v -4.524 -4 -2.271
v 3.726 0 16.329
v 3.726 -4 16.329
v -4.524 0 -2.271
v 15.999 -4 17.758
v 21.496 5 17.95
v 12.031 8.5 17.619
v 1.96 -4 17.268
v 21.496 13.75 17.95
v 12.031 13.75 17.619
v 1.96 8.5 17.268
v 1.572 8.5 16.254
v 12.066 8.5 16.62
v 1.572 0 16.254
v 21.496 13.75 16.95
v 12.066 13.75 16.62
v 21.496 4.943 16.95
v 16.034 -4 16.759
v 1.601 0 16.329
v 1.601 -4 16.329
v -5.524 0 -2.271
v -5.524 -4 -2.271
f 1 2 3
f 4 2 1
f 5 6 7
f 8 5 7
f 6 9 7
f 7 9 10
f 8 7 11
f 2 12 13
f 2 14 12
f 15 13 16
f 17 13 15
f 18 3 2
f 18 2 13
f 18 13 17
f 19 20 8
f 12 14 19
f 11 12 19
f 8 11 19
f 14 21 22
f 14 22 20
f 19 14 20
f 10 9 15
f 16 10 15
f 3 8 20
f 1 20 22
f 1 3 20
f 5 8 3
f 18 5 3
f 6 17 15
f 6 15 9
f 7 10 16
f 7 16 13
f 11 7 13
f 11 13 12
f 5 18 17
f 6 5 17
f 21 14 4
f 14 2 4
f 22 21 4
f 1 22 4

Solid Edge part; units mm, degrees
sketch "Sketch1" plane through (-12.9316, 0, 8.7363) normal (0, -1, 0) x (1, 0, 0)
  line L0 (16.6581, 7.5929) -> (14.5325, 7.5929)
  line L1 (7.4081, -11.0071) -> (14.5325, 7.5929)
  line L2 (7.4081, -11.0071) -> (8.4081, -11.0071)
  line L3 (16.6581, 7.5929) -> (8.4081, -11.0071)
extrude "Protrusion1" add sketch "Sketch1" along normal blind 4
sketch "Sketch2" plane through (-12.9316, 0, 8.7363) normal (0, -1, 0) x (1, 0, 0)
  line L0 (14.5325, 7.5929) -> (14.8919, 8.5313)
  line L1 (34.4273, 9.2134) -> (14.8919, 8.5313)
  line L2 (34.4273, 8.2134) -> (34.4273, 9.2134)
  line L3 (16.6581, 7.5929) -> (34.4273, 8.2134)
extrude "Protrusion2" add sketch "Sketch2" along normal blind 4 material side at (1.8273, 0, 16.7805)
sketch "Sketch3" plane through (-12.9316, 0, 8.7363) normal (0, -1, 0) x (1, 0, 0)
  line L0 (14.5325, 7.5929) -> (14.8919, 8.5313)
  line L1 (34.4273, 9.2134) -> (14.8919, 8.5313)
  line L2 (34.4273, 8.2134) -> (34.4273, 9.2134)
  line L3 (16.6581, 7.5929) -> (34.4273, 8.2134)
extrude "Protrusion3" add sketch "Sketch3" against normal blind 13.75 material side at (1.8273, 0, 16.7805)
sketch "Sketch4" plane through (11.7448, 4.4474, 17.6092) normal (-0.0348995, 0, 0.9993908) x (0.9993908, 0, 0.0348995)
  line L0 (9.7568, -8.4474) -> (9.7568, 0.5526)
  line L1 (4.2568, -8.4474) -> (9.7568, 0.5526)
  line L2 (9.7568, -8.4474) -> (4.2568, -8.4474)
extrude "Cutout1" cut sketch "Sketch4" along normal mid plane 3.8186
sketch "Sketch5" plane through (-0.2942, 14.8774, 17.1888) normal (-0.0348995, 0, 0.9993908) x (0.9993908, 0, 0.0348995)
  line L0 (1.8325, -1.1274) -> (12.3325, -1.1274)
  line L1 (12.3325, -1.1274) -> (12.3325, -6.3774)
  line L2 (12.3325, -6.3774) -> (1.8325, -6.3774)
  line L3 (1.8325, -6.3774) -> (1.8325, -1.1274)
extrude "ExtrudedCutout_2" cut sketch "Sketch5" against normal blind 10.4175
properties material "Stainless Steel, 420"
